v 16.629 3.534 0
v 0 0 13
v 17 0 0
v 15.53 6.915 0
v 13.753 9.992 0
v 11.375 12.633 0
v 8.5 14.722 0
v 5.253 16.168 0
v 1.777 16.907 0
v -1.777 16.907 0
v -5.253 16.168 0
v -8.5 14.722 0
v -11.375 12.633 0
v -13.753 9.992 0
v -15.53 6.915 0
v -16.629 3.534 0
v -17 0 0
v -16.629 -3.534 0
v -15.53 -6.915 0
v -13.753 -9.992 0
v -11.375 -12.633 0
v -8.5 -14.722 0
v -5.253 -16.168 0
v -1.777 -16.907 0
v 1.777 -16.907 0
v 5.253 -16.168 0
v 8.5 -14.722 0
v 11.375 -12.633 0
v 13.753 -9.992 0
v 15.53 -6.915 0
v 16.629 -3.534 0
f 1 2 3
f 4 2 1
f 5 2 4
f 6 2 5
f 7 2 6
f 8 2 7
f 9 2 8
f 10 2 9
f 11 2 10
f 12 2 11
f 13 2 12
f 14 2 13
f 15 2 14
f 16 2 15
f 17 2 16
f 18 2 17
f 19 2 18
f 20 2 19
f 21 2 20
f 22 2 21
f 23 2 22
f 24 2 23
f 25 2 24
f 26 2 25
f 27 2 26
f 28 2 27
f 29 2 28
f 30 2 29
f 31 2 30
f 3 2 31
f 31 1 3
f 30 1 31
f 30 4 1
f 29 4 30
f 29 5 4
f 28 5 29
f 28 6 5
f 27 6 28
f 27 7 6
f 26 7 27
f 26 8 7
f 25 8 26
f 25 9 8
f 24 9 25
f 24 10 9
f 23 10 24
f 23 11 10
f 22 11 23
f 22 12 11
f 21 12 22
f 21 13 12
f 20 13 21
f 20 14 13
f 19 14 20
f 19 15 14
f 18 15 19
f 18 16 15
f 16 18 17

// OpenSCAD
// Generated by SolidPython 1.0.1 on 2020-07-29 00:46:43


cylinder(h = 13, r1 = 17, r2 = 0);
/***********************************************
*********      SolidPython code:      **********
************************************************
 
# import packages: SolidPython
from solid import *
from solid.utils import *
from itertools import chain, combinations, permutations


class Resize:

    def __init__(self, scad_file):
        self.scad_file = scad_file
        #self.scad_file = import_scad(scad_file)
        # cone/cylinder param:
        self.r1 = 0
        self.r2 = 0
        self.h = 0
        # rectangular prism param:
        self.w = 0
        self.l = 0
        # ellipse param:
        self.r = 0

    # import OpenScad code (file name corresponds to shape)


    # classify shape + parameters
    def assign(self, param1, param2, param3):
        if self.scad_file == 'cone.scad':
            self.r1 = param1
            self.r2 = param2
            self.h = param3
        elif self.scad_file == 'cylinder.scad':
            self.r1 = param1
            self.r2 = param2
            self.h = param3
        elif self.scad_file == 'rectangularPrism.scad':
            self.h = param1
            self.l = param2
            self.w = param3
        else:
            self.r = param1
            self.h = param2

    # resize parameters
    def iterate(self):
        x = range(3, 20, 2)
        i = 1
        if self.scad_file == 'cone.scad':
            tempList = list(permutations(x, 2))
            for temp in tempList:
                param1 = temp[0]
                param2 = temp[1]
                filepath = 'produced_scad_files/' + 'cone' + str(param1) + '_' + str(param2) + '_' + '.scad'
                scad_render_to_file(cylinder(h=param1, r1=param2, r2=0), filepath)

        elif self.scad_file == 'cylinder.scad':
            tempList = list(permutations(x, 3))
            for temp in tempList:
                param1 = temp[0]
                param2 = temp[1]
                filepath = 'produced_scad_files/' + 'cylinder' + str(param1) + '_' + str(param2) + '_' + '.scad'
                scad_render_to_file(cylinder(h=param1, r1=param2, r2=param2), filepath)

        elif self.scad_file == 'rectangularPrism.scad':
            tempList = list(permutations(x, 3))
            for temp in tempList:
                param1 = temp[0]
                param2 = temp[1]
                param3 = temp[2]
                filepath = 'produced_scad_files/' + 'rectangularPrism' + str(param1) + '_' + str(param2) + '_' + str(
                    param3) + '.scad'
                scad_render_to_file(cube(size=(param1, param2, param3)), filepath)

        elif self.scad_file == 'ellipse.scad':
            tempList = list(permutations(x, 4))
            for temp in tempList:
                param1 = temp[0]
                param2 = temp[1]
                param3 = temp[2]
                param4 = temp[3]
                filepath = 'produced_scad_files/' + 'ellipse' + str(param1) + '_' + str(param2) + '_' + str(param3) + '_' + str(param4) + '.scad'
                scad_render_to_file(scale([param1, param2, param3])(sphere(r=param4)), filepath)

    def render_to_scadfile(self):
        scad_render_to_file(scad, 'example.scad') 
 
************************************************/
